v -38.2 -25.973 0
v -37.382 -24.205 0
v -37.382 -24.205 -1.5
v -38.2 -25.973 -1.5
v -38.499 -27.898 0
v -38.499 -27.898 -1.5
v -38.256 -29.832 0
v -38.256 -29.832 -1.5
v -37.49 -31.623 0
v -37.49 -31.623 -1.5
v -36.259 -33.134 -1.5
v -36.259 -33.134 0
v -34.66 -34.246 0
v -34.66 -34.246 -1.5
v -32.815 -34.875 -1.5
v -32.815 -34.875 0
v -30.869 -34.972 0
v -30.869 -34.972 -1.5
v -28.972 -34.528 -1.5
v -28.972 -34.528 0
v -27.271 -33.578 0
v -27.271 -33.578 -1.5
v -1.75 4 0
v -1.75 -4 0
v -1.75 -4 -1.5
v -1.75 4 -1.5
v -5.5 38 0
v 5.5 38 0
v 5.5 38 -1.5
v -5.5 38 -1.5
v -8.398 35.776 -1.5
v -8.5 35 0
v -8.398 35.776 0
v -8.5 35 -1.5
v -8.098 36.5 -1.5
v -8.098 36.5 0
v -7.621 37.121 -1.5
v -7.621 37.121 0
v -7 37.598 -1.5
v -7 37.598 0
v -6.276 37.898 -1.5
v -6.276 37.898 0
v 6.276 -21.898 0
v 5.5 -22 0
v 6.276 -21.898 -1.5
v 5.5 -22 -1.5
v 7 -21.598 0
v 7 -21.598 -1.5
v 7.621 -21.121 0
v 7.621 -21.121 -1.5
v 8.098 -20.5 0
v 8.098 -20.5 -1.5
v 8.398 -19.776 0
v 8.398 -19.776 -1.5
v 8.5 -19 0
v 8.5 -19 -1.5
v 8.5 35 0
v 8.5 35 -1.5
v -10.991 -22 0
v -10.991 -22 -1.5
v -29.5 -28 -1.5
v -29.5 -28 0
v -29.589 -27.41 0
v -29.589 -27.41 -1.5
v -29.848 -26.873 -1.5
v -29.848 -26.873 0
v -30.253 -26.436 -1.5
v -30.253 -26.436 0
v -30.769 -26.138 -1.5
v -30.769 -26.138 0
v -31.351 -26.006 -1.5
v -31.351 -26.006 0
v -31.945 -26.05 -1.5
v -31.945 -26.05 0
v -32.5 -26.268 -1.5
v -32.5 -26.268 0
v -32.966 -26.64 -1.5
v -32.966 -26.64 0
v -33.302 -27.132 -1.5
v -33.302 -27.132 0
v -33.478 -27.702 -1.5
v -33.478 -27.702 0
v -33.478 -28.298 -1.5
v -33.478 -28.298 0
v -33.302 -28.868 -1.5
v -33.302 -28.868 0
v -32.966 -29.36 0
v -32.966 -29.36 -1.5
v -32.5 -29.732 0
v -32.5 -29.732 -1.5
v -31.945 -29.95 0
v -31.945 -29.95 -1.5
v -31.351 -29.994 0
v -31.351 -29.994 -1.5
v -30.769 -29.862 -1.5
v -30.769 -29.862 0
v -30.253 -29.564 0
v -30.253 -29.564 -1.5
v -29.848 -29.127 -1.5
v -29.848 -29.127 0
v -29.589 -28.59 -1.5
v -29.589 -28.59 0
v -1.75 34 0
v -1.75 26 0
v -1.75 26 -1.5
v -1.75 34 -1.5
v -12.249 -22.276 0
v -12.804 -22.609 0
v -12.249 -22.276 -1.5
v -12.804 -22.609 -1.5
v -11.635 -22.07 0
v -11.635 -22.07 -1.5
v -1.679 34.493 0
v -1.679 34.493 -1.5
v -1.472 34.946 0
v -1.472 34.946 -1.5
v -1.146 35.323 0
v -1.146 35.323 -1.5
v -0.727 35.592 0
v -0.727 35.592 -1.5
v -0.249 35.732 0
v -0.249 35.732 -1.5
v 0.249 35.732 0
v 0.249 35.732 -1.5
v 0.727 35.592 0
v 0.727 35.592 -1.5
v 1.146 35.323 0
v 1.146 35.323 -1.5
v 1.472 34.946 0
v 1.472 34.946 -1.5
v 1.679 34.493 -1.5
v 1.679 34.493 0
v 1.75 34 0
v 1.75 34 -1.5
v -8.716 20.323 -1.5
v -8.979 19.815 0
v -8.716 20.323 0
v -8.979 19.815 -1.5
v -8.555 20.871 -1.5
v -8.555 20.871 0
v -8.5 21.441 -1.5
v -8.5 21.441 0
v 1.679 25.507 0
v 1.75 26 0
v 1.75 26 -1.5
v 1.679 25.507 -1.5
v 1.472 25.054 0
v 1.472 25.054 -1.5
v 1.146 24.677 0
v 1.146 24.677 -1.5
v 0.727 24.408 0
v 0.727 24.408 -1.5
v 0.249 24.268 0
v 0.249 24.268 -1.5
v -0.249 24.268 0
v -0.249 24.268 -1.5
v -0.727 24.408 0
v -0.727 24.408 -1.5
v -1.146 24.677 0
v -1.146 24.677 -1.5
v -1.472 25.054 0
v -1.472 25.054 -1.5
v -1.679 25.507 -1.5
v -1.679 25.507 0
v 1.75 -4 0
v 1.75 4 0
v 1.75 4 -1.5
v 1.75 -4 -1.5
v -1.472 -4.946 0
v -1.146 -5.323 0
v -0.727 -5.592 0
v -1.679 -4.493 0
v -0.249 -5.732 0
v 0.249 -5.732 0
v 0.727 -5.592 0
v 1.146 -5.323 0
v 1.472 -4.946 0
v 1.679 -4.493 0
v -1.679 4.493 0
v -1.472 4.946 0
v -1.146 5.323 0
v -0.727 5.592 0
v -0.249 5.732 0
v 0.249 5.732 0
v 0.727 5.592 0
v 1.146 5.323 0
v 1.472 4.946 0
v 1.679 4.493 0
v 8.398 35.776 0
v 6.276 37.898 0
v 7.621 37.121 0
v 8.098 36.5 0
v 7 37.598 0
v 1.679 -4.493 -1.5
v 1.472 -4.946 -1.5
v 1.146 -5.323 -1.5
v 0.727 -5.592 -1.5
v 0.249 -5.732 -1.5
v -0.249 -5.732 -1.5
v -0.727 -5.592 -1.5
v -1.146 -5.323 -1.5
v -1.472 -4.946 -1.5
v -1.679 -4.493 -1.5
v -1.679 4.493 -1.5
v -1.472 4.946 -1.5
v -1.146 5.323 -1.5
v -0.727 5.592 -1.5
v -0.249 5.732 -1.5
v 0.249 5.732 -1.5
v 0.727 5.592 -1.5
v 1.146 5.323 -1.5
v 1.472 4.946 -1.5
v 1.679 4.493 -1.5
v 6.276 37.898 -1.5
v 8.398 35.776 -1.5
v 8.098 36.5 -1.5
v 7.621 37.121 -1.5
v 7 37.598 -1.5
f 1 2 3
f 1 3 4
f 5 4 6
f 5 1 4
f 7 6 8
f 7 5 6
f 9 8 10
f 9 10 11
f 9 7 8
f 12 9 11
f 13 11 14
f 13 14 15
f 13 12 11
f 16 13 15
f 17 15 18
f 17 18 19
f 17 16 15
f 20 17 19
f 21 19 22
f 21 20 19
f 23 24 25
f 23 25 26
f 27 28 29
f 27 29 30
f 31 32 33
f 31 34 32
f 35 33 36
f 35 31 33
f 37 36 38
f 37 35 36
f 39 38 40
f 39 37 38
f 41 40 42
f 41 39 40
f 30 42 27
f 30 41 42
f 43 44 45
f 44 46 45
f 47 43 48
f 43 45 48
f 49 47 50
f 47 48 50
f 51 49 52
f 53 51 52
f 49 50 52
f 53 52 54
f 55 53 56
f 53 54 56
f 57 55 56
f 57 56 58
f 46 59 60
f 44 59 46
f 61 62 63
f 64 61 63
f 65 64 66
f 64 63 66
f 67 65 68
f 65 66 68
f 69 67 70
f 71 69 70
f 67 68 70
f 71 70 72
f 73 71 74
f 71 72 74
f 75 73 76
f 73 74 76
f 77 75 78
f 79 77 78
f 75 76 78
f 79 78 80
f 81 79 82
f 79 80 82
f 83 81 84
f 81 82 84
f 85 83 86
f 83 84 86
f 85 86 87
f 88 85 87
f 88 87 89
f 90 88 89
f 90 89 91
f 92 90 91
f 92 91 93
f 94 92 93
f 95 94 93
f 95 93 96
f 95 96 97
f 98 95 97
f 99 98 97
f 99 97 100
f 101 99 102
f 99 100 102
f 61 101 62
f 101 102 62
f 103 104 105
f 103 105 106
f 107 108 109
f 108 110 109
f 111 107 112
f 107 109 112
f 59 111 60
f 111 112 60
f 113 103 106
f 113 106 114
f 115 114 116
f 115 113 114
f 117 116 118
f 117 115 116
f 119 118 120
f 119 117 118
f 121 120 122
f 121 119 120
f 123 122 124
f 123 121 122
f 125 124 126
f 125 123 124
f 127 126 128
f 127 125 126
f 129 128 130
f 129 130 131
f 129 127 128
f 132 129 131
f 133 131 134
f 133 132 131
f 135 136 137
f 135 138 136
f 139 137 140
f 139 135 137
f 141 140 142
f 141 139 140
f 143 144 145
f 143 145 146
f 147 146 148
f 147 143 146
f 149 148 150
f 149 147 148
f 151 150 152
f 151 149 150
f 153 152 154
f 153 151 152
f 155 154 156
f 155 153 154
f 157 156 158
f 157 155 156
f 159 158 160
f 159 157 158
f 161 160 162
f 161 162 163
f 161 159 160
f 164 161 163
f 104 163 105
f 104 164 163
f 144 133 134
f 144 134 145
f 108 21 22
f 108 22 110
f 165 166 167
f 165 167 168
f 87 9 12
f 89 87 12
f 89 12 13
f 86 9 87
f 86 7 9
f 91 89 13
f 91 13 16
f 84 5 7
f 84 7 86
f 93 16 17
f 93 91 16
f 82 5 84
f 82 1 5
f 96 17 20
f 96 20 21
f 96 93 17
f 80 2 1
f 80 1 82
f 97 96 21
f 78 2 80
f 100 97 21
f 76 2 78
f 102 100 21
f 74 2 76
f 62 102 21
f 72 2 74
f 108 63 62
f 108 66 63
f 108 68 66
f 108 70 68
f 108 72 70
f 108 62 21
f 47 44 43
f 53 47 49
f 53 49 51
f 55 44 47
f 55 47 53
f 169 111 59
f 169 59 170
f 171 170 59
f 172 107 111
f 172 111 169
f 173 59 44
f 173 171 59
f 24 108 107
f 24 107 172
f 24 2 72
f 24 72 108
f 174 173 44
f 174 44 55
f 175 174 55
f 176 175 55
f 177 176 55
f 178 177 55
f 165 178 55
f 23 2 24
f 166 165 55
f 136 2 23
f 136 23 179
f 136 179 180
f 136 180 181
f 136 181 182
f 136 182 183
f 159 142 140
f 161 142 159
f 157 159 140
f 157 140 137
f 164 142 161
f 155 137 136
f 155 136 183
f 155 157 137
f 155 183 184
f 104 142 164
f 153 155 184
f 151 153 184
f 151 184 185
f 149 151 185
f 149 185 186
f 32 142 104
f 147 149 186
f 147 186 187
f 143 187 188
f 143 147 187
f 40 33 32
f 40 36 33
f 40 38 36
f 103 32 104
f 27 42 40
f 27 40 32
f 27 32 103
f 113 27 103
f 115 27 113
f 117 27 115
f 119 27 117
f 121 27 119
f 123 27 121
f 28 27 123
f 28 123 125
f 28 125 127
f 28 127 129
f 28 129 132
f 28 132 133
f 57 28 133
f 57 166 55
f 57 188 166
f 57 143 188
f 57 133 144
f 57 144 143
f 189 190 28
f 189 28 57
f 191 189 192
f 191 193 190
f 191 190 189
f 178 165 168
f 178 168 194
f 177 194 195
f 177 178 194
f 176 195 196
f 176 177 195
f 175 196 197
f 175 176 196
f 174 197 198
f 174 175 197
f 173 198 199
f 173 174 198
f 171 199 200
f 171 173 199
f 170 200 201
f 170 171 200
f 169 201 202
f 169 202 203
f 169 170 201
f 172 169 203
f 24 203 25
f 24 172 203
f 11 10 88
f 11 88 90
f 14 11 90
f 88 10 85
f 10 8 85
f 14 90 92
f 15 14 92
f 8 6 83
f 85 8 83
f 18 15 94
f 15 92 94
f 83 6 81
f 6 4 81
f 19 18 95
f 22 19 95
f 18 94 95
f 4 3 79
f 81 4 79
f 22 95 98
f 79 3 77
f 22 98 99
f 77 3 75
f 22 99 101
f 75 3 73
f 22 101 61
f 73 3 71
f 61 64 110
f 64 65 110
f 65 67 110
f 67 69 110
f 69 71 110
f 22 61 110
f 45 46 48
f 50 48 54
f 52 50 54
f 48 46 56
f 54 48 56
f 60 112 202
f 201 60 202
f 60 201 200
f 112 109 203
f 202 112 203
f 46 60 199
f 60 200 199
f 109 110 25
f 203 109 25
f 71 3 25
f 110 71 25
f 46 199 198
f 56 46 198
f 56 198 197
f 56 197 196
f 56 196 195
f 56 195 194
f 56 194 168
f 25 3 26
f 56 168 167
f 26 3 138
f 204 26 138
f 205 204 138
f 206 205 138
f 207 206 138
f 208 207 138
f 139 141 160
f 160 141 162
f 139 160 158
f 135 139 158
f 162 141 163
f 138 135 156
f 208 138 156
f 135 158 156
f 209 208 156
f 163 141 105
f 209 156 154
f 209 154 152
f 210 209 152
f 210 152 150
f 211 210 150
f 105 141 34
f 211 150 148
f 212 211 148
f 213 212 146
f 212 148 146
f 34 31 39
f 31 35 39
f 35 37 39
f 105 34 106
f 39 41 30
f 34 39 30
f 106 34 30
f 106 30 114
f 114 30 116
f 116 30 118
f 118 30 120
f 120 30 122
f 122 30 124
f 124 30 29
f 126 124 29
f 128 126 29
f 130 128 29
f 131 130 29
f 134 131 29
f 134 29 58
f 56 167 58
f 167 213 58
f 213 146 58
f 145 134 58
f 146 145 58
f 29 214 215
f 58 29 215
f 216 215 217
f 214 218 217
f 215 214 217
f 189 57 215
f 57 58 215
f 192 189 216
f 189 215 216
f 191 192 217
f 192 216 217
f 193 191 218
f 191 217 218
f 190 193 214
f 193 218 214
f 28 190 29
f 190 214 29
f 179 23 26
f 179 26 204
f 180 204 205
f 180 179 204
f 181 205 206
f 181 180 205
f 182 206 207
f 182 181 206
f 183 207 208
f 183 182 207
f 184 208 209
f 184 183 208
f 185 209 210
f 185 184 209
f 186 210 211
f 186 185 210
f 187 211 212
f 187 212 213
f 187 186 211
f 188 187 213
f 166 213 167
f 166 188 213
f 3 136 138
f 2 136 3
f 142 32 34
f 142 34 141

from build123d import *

# Parameters (mm, degrees)
ESQUISSE1_R               = 2
T_LE_DE_BASE_PLI_E1_DEPTH = 1.5
CONG_1_R                  = 3


# Sheet-metal steps are written as plain solids
with BuildPart() as part:
    # Esquisse1 → Tôle de base pliée1 (new body)
    with BuildSketch(Plane.XY):
        with BuildLine():
            Line((-27.270863059, -33.578028391), (-12, -22))
            Line((-12, -22), (8.5, -22))
            Line((8.5, -22), (8.5, 38))
            Line((8.5, 38), (-8.5, 38))
            Line((-8.5, 38), (-8.5, 20.557195103))
            Line((-8.5, 20.557195103), (-37.381886846, -24.204817905))
            ThreePointArc((-37.381886846, -24.204817905), (-36.258903683, -33.133501313), (-27.270863059, -33.578028391))
        make_face()
        with Locations((-31.5, -28)):
            Circle(ESQUISSE1_R, mode=Mode.SUBTRACT)
        with BuildLine():
            Line((1.75, 4), (1.75, -4))
            ThreePointArc((1.75, -4), (0, -5.75), (-1.75, -4))
            Line((-1.75, -4), (-1.75, 4))
            ThreePointArc((-1.75, 4), (0, 5.75), (1.75, 4))
        make_face(mode=Mode.SUBTRACT)
        with BuildLine():
            Line((1.75, 34), (1.75, 26))
            ThreePointArc((1.75, 26), (0, 24.25), (-1.75, 26))
            Line((-1.75, 26), (-1.75, 34))
            ThreePointArc((-1.75, 34), (0, 35.75), (1.75, 34))
        make_face(mode=Mode.SUBTRACT)
    extrude(amount=-T_LE_DE_BASE_PLI_E1_DEPTH)

    # Congé1
    cong_1_edges = [part.edges().sort_by_distance(p)[0] for p in [
        (-8.5, 38, -0.75),
        (8.5, 38, -0.75),
        (8.5, -22, -0.75),
        (-12, -22, -0.75),
        (-8.5, 20.557195103, -0.75),
    ]]
    fillet(cong_1_edges, radius=CONG_1_R)


solid = part.part
